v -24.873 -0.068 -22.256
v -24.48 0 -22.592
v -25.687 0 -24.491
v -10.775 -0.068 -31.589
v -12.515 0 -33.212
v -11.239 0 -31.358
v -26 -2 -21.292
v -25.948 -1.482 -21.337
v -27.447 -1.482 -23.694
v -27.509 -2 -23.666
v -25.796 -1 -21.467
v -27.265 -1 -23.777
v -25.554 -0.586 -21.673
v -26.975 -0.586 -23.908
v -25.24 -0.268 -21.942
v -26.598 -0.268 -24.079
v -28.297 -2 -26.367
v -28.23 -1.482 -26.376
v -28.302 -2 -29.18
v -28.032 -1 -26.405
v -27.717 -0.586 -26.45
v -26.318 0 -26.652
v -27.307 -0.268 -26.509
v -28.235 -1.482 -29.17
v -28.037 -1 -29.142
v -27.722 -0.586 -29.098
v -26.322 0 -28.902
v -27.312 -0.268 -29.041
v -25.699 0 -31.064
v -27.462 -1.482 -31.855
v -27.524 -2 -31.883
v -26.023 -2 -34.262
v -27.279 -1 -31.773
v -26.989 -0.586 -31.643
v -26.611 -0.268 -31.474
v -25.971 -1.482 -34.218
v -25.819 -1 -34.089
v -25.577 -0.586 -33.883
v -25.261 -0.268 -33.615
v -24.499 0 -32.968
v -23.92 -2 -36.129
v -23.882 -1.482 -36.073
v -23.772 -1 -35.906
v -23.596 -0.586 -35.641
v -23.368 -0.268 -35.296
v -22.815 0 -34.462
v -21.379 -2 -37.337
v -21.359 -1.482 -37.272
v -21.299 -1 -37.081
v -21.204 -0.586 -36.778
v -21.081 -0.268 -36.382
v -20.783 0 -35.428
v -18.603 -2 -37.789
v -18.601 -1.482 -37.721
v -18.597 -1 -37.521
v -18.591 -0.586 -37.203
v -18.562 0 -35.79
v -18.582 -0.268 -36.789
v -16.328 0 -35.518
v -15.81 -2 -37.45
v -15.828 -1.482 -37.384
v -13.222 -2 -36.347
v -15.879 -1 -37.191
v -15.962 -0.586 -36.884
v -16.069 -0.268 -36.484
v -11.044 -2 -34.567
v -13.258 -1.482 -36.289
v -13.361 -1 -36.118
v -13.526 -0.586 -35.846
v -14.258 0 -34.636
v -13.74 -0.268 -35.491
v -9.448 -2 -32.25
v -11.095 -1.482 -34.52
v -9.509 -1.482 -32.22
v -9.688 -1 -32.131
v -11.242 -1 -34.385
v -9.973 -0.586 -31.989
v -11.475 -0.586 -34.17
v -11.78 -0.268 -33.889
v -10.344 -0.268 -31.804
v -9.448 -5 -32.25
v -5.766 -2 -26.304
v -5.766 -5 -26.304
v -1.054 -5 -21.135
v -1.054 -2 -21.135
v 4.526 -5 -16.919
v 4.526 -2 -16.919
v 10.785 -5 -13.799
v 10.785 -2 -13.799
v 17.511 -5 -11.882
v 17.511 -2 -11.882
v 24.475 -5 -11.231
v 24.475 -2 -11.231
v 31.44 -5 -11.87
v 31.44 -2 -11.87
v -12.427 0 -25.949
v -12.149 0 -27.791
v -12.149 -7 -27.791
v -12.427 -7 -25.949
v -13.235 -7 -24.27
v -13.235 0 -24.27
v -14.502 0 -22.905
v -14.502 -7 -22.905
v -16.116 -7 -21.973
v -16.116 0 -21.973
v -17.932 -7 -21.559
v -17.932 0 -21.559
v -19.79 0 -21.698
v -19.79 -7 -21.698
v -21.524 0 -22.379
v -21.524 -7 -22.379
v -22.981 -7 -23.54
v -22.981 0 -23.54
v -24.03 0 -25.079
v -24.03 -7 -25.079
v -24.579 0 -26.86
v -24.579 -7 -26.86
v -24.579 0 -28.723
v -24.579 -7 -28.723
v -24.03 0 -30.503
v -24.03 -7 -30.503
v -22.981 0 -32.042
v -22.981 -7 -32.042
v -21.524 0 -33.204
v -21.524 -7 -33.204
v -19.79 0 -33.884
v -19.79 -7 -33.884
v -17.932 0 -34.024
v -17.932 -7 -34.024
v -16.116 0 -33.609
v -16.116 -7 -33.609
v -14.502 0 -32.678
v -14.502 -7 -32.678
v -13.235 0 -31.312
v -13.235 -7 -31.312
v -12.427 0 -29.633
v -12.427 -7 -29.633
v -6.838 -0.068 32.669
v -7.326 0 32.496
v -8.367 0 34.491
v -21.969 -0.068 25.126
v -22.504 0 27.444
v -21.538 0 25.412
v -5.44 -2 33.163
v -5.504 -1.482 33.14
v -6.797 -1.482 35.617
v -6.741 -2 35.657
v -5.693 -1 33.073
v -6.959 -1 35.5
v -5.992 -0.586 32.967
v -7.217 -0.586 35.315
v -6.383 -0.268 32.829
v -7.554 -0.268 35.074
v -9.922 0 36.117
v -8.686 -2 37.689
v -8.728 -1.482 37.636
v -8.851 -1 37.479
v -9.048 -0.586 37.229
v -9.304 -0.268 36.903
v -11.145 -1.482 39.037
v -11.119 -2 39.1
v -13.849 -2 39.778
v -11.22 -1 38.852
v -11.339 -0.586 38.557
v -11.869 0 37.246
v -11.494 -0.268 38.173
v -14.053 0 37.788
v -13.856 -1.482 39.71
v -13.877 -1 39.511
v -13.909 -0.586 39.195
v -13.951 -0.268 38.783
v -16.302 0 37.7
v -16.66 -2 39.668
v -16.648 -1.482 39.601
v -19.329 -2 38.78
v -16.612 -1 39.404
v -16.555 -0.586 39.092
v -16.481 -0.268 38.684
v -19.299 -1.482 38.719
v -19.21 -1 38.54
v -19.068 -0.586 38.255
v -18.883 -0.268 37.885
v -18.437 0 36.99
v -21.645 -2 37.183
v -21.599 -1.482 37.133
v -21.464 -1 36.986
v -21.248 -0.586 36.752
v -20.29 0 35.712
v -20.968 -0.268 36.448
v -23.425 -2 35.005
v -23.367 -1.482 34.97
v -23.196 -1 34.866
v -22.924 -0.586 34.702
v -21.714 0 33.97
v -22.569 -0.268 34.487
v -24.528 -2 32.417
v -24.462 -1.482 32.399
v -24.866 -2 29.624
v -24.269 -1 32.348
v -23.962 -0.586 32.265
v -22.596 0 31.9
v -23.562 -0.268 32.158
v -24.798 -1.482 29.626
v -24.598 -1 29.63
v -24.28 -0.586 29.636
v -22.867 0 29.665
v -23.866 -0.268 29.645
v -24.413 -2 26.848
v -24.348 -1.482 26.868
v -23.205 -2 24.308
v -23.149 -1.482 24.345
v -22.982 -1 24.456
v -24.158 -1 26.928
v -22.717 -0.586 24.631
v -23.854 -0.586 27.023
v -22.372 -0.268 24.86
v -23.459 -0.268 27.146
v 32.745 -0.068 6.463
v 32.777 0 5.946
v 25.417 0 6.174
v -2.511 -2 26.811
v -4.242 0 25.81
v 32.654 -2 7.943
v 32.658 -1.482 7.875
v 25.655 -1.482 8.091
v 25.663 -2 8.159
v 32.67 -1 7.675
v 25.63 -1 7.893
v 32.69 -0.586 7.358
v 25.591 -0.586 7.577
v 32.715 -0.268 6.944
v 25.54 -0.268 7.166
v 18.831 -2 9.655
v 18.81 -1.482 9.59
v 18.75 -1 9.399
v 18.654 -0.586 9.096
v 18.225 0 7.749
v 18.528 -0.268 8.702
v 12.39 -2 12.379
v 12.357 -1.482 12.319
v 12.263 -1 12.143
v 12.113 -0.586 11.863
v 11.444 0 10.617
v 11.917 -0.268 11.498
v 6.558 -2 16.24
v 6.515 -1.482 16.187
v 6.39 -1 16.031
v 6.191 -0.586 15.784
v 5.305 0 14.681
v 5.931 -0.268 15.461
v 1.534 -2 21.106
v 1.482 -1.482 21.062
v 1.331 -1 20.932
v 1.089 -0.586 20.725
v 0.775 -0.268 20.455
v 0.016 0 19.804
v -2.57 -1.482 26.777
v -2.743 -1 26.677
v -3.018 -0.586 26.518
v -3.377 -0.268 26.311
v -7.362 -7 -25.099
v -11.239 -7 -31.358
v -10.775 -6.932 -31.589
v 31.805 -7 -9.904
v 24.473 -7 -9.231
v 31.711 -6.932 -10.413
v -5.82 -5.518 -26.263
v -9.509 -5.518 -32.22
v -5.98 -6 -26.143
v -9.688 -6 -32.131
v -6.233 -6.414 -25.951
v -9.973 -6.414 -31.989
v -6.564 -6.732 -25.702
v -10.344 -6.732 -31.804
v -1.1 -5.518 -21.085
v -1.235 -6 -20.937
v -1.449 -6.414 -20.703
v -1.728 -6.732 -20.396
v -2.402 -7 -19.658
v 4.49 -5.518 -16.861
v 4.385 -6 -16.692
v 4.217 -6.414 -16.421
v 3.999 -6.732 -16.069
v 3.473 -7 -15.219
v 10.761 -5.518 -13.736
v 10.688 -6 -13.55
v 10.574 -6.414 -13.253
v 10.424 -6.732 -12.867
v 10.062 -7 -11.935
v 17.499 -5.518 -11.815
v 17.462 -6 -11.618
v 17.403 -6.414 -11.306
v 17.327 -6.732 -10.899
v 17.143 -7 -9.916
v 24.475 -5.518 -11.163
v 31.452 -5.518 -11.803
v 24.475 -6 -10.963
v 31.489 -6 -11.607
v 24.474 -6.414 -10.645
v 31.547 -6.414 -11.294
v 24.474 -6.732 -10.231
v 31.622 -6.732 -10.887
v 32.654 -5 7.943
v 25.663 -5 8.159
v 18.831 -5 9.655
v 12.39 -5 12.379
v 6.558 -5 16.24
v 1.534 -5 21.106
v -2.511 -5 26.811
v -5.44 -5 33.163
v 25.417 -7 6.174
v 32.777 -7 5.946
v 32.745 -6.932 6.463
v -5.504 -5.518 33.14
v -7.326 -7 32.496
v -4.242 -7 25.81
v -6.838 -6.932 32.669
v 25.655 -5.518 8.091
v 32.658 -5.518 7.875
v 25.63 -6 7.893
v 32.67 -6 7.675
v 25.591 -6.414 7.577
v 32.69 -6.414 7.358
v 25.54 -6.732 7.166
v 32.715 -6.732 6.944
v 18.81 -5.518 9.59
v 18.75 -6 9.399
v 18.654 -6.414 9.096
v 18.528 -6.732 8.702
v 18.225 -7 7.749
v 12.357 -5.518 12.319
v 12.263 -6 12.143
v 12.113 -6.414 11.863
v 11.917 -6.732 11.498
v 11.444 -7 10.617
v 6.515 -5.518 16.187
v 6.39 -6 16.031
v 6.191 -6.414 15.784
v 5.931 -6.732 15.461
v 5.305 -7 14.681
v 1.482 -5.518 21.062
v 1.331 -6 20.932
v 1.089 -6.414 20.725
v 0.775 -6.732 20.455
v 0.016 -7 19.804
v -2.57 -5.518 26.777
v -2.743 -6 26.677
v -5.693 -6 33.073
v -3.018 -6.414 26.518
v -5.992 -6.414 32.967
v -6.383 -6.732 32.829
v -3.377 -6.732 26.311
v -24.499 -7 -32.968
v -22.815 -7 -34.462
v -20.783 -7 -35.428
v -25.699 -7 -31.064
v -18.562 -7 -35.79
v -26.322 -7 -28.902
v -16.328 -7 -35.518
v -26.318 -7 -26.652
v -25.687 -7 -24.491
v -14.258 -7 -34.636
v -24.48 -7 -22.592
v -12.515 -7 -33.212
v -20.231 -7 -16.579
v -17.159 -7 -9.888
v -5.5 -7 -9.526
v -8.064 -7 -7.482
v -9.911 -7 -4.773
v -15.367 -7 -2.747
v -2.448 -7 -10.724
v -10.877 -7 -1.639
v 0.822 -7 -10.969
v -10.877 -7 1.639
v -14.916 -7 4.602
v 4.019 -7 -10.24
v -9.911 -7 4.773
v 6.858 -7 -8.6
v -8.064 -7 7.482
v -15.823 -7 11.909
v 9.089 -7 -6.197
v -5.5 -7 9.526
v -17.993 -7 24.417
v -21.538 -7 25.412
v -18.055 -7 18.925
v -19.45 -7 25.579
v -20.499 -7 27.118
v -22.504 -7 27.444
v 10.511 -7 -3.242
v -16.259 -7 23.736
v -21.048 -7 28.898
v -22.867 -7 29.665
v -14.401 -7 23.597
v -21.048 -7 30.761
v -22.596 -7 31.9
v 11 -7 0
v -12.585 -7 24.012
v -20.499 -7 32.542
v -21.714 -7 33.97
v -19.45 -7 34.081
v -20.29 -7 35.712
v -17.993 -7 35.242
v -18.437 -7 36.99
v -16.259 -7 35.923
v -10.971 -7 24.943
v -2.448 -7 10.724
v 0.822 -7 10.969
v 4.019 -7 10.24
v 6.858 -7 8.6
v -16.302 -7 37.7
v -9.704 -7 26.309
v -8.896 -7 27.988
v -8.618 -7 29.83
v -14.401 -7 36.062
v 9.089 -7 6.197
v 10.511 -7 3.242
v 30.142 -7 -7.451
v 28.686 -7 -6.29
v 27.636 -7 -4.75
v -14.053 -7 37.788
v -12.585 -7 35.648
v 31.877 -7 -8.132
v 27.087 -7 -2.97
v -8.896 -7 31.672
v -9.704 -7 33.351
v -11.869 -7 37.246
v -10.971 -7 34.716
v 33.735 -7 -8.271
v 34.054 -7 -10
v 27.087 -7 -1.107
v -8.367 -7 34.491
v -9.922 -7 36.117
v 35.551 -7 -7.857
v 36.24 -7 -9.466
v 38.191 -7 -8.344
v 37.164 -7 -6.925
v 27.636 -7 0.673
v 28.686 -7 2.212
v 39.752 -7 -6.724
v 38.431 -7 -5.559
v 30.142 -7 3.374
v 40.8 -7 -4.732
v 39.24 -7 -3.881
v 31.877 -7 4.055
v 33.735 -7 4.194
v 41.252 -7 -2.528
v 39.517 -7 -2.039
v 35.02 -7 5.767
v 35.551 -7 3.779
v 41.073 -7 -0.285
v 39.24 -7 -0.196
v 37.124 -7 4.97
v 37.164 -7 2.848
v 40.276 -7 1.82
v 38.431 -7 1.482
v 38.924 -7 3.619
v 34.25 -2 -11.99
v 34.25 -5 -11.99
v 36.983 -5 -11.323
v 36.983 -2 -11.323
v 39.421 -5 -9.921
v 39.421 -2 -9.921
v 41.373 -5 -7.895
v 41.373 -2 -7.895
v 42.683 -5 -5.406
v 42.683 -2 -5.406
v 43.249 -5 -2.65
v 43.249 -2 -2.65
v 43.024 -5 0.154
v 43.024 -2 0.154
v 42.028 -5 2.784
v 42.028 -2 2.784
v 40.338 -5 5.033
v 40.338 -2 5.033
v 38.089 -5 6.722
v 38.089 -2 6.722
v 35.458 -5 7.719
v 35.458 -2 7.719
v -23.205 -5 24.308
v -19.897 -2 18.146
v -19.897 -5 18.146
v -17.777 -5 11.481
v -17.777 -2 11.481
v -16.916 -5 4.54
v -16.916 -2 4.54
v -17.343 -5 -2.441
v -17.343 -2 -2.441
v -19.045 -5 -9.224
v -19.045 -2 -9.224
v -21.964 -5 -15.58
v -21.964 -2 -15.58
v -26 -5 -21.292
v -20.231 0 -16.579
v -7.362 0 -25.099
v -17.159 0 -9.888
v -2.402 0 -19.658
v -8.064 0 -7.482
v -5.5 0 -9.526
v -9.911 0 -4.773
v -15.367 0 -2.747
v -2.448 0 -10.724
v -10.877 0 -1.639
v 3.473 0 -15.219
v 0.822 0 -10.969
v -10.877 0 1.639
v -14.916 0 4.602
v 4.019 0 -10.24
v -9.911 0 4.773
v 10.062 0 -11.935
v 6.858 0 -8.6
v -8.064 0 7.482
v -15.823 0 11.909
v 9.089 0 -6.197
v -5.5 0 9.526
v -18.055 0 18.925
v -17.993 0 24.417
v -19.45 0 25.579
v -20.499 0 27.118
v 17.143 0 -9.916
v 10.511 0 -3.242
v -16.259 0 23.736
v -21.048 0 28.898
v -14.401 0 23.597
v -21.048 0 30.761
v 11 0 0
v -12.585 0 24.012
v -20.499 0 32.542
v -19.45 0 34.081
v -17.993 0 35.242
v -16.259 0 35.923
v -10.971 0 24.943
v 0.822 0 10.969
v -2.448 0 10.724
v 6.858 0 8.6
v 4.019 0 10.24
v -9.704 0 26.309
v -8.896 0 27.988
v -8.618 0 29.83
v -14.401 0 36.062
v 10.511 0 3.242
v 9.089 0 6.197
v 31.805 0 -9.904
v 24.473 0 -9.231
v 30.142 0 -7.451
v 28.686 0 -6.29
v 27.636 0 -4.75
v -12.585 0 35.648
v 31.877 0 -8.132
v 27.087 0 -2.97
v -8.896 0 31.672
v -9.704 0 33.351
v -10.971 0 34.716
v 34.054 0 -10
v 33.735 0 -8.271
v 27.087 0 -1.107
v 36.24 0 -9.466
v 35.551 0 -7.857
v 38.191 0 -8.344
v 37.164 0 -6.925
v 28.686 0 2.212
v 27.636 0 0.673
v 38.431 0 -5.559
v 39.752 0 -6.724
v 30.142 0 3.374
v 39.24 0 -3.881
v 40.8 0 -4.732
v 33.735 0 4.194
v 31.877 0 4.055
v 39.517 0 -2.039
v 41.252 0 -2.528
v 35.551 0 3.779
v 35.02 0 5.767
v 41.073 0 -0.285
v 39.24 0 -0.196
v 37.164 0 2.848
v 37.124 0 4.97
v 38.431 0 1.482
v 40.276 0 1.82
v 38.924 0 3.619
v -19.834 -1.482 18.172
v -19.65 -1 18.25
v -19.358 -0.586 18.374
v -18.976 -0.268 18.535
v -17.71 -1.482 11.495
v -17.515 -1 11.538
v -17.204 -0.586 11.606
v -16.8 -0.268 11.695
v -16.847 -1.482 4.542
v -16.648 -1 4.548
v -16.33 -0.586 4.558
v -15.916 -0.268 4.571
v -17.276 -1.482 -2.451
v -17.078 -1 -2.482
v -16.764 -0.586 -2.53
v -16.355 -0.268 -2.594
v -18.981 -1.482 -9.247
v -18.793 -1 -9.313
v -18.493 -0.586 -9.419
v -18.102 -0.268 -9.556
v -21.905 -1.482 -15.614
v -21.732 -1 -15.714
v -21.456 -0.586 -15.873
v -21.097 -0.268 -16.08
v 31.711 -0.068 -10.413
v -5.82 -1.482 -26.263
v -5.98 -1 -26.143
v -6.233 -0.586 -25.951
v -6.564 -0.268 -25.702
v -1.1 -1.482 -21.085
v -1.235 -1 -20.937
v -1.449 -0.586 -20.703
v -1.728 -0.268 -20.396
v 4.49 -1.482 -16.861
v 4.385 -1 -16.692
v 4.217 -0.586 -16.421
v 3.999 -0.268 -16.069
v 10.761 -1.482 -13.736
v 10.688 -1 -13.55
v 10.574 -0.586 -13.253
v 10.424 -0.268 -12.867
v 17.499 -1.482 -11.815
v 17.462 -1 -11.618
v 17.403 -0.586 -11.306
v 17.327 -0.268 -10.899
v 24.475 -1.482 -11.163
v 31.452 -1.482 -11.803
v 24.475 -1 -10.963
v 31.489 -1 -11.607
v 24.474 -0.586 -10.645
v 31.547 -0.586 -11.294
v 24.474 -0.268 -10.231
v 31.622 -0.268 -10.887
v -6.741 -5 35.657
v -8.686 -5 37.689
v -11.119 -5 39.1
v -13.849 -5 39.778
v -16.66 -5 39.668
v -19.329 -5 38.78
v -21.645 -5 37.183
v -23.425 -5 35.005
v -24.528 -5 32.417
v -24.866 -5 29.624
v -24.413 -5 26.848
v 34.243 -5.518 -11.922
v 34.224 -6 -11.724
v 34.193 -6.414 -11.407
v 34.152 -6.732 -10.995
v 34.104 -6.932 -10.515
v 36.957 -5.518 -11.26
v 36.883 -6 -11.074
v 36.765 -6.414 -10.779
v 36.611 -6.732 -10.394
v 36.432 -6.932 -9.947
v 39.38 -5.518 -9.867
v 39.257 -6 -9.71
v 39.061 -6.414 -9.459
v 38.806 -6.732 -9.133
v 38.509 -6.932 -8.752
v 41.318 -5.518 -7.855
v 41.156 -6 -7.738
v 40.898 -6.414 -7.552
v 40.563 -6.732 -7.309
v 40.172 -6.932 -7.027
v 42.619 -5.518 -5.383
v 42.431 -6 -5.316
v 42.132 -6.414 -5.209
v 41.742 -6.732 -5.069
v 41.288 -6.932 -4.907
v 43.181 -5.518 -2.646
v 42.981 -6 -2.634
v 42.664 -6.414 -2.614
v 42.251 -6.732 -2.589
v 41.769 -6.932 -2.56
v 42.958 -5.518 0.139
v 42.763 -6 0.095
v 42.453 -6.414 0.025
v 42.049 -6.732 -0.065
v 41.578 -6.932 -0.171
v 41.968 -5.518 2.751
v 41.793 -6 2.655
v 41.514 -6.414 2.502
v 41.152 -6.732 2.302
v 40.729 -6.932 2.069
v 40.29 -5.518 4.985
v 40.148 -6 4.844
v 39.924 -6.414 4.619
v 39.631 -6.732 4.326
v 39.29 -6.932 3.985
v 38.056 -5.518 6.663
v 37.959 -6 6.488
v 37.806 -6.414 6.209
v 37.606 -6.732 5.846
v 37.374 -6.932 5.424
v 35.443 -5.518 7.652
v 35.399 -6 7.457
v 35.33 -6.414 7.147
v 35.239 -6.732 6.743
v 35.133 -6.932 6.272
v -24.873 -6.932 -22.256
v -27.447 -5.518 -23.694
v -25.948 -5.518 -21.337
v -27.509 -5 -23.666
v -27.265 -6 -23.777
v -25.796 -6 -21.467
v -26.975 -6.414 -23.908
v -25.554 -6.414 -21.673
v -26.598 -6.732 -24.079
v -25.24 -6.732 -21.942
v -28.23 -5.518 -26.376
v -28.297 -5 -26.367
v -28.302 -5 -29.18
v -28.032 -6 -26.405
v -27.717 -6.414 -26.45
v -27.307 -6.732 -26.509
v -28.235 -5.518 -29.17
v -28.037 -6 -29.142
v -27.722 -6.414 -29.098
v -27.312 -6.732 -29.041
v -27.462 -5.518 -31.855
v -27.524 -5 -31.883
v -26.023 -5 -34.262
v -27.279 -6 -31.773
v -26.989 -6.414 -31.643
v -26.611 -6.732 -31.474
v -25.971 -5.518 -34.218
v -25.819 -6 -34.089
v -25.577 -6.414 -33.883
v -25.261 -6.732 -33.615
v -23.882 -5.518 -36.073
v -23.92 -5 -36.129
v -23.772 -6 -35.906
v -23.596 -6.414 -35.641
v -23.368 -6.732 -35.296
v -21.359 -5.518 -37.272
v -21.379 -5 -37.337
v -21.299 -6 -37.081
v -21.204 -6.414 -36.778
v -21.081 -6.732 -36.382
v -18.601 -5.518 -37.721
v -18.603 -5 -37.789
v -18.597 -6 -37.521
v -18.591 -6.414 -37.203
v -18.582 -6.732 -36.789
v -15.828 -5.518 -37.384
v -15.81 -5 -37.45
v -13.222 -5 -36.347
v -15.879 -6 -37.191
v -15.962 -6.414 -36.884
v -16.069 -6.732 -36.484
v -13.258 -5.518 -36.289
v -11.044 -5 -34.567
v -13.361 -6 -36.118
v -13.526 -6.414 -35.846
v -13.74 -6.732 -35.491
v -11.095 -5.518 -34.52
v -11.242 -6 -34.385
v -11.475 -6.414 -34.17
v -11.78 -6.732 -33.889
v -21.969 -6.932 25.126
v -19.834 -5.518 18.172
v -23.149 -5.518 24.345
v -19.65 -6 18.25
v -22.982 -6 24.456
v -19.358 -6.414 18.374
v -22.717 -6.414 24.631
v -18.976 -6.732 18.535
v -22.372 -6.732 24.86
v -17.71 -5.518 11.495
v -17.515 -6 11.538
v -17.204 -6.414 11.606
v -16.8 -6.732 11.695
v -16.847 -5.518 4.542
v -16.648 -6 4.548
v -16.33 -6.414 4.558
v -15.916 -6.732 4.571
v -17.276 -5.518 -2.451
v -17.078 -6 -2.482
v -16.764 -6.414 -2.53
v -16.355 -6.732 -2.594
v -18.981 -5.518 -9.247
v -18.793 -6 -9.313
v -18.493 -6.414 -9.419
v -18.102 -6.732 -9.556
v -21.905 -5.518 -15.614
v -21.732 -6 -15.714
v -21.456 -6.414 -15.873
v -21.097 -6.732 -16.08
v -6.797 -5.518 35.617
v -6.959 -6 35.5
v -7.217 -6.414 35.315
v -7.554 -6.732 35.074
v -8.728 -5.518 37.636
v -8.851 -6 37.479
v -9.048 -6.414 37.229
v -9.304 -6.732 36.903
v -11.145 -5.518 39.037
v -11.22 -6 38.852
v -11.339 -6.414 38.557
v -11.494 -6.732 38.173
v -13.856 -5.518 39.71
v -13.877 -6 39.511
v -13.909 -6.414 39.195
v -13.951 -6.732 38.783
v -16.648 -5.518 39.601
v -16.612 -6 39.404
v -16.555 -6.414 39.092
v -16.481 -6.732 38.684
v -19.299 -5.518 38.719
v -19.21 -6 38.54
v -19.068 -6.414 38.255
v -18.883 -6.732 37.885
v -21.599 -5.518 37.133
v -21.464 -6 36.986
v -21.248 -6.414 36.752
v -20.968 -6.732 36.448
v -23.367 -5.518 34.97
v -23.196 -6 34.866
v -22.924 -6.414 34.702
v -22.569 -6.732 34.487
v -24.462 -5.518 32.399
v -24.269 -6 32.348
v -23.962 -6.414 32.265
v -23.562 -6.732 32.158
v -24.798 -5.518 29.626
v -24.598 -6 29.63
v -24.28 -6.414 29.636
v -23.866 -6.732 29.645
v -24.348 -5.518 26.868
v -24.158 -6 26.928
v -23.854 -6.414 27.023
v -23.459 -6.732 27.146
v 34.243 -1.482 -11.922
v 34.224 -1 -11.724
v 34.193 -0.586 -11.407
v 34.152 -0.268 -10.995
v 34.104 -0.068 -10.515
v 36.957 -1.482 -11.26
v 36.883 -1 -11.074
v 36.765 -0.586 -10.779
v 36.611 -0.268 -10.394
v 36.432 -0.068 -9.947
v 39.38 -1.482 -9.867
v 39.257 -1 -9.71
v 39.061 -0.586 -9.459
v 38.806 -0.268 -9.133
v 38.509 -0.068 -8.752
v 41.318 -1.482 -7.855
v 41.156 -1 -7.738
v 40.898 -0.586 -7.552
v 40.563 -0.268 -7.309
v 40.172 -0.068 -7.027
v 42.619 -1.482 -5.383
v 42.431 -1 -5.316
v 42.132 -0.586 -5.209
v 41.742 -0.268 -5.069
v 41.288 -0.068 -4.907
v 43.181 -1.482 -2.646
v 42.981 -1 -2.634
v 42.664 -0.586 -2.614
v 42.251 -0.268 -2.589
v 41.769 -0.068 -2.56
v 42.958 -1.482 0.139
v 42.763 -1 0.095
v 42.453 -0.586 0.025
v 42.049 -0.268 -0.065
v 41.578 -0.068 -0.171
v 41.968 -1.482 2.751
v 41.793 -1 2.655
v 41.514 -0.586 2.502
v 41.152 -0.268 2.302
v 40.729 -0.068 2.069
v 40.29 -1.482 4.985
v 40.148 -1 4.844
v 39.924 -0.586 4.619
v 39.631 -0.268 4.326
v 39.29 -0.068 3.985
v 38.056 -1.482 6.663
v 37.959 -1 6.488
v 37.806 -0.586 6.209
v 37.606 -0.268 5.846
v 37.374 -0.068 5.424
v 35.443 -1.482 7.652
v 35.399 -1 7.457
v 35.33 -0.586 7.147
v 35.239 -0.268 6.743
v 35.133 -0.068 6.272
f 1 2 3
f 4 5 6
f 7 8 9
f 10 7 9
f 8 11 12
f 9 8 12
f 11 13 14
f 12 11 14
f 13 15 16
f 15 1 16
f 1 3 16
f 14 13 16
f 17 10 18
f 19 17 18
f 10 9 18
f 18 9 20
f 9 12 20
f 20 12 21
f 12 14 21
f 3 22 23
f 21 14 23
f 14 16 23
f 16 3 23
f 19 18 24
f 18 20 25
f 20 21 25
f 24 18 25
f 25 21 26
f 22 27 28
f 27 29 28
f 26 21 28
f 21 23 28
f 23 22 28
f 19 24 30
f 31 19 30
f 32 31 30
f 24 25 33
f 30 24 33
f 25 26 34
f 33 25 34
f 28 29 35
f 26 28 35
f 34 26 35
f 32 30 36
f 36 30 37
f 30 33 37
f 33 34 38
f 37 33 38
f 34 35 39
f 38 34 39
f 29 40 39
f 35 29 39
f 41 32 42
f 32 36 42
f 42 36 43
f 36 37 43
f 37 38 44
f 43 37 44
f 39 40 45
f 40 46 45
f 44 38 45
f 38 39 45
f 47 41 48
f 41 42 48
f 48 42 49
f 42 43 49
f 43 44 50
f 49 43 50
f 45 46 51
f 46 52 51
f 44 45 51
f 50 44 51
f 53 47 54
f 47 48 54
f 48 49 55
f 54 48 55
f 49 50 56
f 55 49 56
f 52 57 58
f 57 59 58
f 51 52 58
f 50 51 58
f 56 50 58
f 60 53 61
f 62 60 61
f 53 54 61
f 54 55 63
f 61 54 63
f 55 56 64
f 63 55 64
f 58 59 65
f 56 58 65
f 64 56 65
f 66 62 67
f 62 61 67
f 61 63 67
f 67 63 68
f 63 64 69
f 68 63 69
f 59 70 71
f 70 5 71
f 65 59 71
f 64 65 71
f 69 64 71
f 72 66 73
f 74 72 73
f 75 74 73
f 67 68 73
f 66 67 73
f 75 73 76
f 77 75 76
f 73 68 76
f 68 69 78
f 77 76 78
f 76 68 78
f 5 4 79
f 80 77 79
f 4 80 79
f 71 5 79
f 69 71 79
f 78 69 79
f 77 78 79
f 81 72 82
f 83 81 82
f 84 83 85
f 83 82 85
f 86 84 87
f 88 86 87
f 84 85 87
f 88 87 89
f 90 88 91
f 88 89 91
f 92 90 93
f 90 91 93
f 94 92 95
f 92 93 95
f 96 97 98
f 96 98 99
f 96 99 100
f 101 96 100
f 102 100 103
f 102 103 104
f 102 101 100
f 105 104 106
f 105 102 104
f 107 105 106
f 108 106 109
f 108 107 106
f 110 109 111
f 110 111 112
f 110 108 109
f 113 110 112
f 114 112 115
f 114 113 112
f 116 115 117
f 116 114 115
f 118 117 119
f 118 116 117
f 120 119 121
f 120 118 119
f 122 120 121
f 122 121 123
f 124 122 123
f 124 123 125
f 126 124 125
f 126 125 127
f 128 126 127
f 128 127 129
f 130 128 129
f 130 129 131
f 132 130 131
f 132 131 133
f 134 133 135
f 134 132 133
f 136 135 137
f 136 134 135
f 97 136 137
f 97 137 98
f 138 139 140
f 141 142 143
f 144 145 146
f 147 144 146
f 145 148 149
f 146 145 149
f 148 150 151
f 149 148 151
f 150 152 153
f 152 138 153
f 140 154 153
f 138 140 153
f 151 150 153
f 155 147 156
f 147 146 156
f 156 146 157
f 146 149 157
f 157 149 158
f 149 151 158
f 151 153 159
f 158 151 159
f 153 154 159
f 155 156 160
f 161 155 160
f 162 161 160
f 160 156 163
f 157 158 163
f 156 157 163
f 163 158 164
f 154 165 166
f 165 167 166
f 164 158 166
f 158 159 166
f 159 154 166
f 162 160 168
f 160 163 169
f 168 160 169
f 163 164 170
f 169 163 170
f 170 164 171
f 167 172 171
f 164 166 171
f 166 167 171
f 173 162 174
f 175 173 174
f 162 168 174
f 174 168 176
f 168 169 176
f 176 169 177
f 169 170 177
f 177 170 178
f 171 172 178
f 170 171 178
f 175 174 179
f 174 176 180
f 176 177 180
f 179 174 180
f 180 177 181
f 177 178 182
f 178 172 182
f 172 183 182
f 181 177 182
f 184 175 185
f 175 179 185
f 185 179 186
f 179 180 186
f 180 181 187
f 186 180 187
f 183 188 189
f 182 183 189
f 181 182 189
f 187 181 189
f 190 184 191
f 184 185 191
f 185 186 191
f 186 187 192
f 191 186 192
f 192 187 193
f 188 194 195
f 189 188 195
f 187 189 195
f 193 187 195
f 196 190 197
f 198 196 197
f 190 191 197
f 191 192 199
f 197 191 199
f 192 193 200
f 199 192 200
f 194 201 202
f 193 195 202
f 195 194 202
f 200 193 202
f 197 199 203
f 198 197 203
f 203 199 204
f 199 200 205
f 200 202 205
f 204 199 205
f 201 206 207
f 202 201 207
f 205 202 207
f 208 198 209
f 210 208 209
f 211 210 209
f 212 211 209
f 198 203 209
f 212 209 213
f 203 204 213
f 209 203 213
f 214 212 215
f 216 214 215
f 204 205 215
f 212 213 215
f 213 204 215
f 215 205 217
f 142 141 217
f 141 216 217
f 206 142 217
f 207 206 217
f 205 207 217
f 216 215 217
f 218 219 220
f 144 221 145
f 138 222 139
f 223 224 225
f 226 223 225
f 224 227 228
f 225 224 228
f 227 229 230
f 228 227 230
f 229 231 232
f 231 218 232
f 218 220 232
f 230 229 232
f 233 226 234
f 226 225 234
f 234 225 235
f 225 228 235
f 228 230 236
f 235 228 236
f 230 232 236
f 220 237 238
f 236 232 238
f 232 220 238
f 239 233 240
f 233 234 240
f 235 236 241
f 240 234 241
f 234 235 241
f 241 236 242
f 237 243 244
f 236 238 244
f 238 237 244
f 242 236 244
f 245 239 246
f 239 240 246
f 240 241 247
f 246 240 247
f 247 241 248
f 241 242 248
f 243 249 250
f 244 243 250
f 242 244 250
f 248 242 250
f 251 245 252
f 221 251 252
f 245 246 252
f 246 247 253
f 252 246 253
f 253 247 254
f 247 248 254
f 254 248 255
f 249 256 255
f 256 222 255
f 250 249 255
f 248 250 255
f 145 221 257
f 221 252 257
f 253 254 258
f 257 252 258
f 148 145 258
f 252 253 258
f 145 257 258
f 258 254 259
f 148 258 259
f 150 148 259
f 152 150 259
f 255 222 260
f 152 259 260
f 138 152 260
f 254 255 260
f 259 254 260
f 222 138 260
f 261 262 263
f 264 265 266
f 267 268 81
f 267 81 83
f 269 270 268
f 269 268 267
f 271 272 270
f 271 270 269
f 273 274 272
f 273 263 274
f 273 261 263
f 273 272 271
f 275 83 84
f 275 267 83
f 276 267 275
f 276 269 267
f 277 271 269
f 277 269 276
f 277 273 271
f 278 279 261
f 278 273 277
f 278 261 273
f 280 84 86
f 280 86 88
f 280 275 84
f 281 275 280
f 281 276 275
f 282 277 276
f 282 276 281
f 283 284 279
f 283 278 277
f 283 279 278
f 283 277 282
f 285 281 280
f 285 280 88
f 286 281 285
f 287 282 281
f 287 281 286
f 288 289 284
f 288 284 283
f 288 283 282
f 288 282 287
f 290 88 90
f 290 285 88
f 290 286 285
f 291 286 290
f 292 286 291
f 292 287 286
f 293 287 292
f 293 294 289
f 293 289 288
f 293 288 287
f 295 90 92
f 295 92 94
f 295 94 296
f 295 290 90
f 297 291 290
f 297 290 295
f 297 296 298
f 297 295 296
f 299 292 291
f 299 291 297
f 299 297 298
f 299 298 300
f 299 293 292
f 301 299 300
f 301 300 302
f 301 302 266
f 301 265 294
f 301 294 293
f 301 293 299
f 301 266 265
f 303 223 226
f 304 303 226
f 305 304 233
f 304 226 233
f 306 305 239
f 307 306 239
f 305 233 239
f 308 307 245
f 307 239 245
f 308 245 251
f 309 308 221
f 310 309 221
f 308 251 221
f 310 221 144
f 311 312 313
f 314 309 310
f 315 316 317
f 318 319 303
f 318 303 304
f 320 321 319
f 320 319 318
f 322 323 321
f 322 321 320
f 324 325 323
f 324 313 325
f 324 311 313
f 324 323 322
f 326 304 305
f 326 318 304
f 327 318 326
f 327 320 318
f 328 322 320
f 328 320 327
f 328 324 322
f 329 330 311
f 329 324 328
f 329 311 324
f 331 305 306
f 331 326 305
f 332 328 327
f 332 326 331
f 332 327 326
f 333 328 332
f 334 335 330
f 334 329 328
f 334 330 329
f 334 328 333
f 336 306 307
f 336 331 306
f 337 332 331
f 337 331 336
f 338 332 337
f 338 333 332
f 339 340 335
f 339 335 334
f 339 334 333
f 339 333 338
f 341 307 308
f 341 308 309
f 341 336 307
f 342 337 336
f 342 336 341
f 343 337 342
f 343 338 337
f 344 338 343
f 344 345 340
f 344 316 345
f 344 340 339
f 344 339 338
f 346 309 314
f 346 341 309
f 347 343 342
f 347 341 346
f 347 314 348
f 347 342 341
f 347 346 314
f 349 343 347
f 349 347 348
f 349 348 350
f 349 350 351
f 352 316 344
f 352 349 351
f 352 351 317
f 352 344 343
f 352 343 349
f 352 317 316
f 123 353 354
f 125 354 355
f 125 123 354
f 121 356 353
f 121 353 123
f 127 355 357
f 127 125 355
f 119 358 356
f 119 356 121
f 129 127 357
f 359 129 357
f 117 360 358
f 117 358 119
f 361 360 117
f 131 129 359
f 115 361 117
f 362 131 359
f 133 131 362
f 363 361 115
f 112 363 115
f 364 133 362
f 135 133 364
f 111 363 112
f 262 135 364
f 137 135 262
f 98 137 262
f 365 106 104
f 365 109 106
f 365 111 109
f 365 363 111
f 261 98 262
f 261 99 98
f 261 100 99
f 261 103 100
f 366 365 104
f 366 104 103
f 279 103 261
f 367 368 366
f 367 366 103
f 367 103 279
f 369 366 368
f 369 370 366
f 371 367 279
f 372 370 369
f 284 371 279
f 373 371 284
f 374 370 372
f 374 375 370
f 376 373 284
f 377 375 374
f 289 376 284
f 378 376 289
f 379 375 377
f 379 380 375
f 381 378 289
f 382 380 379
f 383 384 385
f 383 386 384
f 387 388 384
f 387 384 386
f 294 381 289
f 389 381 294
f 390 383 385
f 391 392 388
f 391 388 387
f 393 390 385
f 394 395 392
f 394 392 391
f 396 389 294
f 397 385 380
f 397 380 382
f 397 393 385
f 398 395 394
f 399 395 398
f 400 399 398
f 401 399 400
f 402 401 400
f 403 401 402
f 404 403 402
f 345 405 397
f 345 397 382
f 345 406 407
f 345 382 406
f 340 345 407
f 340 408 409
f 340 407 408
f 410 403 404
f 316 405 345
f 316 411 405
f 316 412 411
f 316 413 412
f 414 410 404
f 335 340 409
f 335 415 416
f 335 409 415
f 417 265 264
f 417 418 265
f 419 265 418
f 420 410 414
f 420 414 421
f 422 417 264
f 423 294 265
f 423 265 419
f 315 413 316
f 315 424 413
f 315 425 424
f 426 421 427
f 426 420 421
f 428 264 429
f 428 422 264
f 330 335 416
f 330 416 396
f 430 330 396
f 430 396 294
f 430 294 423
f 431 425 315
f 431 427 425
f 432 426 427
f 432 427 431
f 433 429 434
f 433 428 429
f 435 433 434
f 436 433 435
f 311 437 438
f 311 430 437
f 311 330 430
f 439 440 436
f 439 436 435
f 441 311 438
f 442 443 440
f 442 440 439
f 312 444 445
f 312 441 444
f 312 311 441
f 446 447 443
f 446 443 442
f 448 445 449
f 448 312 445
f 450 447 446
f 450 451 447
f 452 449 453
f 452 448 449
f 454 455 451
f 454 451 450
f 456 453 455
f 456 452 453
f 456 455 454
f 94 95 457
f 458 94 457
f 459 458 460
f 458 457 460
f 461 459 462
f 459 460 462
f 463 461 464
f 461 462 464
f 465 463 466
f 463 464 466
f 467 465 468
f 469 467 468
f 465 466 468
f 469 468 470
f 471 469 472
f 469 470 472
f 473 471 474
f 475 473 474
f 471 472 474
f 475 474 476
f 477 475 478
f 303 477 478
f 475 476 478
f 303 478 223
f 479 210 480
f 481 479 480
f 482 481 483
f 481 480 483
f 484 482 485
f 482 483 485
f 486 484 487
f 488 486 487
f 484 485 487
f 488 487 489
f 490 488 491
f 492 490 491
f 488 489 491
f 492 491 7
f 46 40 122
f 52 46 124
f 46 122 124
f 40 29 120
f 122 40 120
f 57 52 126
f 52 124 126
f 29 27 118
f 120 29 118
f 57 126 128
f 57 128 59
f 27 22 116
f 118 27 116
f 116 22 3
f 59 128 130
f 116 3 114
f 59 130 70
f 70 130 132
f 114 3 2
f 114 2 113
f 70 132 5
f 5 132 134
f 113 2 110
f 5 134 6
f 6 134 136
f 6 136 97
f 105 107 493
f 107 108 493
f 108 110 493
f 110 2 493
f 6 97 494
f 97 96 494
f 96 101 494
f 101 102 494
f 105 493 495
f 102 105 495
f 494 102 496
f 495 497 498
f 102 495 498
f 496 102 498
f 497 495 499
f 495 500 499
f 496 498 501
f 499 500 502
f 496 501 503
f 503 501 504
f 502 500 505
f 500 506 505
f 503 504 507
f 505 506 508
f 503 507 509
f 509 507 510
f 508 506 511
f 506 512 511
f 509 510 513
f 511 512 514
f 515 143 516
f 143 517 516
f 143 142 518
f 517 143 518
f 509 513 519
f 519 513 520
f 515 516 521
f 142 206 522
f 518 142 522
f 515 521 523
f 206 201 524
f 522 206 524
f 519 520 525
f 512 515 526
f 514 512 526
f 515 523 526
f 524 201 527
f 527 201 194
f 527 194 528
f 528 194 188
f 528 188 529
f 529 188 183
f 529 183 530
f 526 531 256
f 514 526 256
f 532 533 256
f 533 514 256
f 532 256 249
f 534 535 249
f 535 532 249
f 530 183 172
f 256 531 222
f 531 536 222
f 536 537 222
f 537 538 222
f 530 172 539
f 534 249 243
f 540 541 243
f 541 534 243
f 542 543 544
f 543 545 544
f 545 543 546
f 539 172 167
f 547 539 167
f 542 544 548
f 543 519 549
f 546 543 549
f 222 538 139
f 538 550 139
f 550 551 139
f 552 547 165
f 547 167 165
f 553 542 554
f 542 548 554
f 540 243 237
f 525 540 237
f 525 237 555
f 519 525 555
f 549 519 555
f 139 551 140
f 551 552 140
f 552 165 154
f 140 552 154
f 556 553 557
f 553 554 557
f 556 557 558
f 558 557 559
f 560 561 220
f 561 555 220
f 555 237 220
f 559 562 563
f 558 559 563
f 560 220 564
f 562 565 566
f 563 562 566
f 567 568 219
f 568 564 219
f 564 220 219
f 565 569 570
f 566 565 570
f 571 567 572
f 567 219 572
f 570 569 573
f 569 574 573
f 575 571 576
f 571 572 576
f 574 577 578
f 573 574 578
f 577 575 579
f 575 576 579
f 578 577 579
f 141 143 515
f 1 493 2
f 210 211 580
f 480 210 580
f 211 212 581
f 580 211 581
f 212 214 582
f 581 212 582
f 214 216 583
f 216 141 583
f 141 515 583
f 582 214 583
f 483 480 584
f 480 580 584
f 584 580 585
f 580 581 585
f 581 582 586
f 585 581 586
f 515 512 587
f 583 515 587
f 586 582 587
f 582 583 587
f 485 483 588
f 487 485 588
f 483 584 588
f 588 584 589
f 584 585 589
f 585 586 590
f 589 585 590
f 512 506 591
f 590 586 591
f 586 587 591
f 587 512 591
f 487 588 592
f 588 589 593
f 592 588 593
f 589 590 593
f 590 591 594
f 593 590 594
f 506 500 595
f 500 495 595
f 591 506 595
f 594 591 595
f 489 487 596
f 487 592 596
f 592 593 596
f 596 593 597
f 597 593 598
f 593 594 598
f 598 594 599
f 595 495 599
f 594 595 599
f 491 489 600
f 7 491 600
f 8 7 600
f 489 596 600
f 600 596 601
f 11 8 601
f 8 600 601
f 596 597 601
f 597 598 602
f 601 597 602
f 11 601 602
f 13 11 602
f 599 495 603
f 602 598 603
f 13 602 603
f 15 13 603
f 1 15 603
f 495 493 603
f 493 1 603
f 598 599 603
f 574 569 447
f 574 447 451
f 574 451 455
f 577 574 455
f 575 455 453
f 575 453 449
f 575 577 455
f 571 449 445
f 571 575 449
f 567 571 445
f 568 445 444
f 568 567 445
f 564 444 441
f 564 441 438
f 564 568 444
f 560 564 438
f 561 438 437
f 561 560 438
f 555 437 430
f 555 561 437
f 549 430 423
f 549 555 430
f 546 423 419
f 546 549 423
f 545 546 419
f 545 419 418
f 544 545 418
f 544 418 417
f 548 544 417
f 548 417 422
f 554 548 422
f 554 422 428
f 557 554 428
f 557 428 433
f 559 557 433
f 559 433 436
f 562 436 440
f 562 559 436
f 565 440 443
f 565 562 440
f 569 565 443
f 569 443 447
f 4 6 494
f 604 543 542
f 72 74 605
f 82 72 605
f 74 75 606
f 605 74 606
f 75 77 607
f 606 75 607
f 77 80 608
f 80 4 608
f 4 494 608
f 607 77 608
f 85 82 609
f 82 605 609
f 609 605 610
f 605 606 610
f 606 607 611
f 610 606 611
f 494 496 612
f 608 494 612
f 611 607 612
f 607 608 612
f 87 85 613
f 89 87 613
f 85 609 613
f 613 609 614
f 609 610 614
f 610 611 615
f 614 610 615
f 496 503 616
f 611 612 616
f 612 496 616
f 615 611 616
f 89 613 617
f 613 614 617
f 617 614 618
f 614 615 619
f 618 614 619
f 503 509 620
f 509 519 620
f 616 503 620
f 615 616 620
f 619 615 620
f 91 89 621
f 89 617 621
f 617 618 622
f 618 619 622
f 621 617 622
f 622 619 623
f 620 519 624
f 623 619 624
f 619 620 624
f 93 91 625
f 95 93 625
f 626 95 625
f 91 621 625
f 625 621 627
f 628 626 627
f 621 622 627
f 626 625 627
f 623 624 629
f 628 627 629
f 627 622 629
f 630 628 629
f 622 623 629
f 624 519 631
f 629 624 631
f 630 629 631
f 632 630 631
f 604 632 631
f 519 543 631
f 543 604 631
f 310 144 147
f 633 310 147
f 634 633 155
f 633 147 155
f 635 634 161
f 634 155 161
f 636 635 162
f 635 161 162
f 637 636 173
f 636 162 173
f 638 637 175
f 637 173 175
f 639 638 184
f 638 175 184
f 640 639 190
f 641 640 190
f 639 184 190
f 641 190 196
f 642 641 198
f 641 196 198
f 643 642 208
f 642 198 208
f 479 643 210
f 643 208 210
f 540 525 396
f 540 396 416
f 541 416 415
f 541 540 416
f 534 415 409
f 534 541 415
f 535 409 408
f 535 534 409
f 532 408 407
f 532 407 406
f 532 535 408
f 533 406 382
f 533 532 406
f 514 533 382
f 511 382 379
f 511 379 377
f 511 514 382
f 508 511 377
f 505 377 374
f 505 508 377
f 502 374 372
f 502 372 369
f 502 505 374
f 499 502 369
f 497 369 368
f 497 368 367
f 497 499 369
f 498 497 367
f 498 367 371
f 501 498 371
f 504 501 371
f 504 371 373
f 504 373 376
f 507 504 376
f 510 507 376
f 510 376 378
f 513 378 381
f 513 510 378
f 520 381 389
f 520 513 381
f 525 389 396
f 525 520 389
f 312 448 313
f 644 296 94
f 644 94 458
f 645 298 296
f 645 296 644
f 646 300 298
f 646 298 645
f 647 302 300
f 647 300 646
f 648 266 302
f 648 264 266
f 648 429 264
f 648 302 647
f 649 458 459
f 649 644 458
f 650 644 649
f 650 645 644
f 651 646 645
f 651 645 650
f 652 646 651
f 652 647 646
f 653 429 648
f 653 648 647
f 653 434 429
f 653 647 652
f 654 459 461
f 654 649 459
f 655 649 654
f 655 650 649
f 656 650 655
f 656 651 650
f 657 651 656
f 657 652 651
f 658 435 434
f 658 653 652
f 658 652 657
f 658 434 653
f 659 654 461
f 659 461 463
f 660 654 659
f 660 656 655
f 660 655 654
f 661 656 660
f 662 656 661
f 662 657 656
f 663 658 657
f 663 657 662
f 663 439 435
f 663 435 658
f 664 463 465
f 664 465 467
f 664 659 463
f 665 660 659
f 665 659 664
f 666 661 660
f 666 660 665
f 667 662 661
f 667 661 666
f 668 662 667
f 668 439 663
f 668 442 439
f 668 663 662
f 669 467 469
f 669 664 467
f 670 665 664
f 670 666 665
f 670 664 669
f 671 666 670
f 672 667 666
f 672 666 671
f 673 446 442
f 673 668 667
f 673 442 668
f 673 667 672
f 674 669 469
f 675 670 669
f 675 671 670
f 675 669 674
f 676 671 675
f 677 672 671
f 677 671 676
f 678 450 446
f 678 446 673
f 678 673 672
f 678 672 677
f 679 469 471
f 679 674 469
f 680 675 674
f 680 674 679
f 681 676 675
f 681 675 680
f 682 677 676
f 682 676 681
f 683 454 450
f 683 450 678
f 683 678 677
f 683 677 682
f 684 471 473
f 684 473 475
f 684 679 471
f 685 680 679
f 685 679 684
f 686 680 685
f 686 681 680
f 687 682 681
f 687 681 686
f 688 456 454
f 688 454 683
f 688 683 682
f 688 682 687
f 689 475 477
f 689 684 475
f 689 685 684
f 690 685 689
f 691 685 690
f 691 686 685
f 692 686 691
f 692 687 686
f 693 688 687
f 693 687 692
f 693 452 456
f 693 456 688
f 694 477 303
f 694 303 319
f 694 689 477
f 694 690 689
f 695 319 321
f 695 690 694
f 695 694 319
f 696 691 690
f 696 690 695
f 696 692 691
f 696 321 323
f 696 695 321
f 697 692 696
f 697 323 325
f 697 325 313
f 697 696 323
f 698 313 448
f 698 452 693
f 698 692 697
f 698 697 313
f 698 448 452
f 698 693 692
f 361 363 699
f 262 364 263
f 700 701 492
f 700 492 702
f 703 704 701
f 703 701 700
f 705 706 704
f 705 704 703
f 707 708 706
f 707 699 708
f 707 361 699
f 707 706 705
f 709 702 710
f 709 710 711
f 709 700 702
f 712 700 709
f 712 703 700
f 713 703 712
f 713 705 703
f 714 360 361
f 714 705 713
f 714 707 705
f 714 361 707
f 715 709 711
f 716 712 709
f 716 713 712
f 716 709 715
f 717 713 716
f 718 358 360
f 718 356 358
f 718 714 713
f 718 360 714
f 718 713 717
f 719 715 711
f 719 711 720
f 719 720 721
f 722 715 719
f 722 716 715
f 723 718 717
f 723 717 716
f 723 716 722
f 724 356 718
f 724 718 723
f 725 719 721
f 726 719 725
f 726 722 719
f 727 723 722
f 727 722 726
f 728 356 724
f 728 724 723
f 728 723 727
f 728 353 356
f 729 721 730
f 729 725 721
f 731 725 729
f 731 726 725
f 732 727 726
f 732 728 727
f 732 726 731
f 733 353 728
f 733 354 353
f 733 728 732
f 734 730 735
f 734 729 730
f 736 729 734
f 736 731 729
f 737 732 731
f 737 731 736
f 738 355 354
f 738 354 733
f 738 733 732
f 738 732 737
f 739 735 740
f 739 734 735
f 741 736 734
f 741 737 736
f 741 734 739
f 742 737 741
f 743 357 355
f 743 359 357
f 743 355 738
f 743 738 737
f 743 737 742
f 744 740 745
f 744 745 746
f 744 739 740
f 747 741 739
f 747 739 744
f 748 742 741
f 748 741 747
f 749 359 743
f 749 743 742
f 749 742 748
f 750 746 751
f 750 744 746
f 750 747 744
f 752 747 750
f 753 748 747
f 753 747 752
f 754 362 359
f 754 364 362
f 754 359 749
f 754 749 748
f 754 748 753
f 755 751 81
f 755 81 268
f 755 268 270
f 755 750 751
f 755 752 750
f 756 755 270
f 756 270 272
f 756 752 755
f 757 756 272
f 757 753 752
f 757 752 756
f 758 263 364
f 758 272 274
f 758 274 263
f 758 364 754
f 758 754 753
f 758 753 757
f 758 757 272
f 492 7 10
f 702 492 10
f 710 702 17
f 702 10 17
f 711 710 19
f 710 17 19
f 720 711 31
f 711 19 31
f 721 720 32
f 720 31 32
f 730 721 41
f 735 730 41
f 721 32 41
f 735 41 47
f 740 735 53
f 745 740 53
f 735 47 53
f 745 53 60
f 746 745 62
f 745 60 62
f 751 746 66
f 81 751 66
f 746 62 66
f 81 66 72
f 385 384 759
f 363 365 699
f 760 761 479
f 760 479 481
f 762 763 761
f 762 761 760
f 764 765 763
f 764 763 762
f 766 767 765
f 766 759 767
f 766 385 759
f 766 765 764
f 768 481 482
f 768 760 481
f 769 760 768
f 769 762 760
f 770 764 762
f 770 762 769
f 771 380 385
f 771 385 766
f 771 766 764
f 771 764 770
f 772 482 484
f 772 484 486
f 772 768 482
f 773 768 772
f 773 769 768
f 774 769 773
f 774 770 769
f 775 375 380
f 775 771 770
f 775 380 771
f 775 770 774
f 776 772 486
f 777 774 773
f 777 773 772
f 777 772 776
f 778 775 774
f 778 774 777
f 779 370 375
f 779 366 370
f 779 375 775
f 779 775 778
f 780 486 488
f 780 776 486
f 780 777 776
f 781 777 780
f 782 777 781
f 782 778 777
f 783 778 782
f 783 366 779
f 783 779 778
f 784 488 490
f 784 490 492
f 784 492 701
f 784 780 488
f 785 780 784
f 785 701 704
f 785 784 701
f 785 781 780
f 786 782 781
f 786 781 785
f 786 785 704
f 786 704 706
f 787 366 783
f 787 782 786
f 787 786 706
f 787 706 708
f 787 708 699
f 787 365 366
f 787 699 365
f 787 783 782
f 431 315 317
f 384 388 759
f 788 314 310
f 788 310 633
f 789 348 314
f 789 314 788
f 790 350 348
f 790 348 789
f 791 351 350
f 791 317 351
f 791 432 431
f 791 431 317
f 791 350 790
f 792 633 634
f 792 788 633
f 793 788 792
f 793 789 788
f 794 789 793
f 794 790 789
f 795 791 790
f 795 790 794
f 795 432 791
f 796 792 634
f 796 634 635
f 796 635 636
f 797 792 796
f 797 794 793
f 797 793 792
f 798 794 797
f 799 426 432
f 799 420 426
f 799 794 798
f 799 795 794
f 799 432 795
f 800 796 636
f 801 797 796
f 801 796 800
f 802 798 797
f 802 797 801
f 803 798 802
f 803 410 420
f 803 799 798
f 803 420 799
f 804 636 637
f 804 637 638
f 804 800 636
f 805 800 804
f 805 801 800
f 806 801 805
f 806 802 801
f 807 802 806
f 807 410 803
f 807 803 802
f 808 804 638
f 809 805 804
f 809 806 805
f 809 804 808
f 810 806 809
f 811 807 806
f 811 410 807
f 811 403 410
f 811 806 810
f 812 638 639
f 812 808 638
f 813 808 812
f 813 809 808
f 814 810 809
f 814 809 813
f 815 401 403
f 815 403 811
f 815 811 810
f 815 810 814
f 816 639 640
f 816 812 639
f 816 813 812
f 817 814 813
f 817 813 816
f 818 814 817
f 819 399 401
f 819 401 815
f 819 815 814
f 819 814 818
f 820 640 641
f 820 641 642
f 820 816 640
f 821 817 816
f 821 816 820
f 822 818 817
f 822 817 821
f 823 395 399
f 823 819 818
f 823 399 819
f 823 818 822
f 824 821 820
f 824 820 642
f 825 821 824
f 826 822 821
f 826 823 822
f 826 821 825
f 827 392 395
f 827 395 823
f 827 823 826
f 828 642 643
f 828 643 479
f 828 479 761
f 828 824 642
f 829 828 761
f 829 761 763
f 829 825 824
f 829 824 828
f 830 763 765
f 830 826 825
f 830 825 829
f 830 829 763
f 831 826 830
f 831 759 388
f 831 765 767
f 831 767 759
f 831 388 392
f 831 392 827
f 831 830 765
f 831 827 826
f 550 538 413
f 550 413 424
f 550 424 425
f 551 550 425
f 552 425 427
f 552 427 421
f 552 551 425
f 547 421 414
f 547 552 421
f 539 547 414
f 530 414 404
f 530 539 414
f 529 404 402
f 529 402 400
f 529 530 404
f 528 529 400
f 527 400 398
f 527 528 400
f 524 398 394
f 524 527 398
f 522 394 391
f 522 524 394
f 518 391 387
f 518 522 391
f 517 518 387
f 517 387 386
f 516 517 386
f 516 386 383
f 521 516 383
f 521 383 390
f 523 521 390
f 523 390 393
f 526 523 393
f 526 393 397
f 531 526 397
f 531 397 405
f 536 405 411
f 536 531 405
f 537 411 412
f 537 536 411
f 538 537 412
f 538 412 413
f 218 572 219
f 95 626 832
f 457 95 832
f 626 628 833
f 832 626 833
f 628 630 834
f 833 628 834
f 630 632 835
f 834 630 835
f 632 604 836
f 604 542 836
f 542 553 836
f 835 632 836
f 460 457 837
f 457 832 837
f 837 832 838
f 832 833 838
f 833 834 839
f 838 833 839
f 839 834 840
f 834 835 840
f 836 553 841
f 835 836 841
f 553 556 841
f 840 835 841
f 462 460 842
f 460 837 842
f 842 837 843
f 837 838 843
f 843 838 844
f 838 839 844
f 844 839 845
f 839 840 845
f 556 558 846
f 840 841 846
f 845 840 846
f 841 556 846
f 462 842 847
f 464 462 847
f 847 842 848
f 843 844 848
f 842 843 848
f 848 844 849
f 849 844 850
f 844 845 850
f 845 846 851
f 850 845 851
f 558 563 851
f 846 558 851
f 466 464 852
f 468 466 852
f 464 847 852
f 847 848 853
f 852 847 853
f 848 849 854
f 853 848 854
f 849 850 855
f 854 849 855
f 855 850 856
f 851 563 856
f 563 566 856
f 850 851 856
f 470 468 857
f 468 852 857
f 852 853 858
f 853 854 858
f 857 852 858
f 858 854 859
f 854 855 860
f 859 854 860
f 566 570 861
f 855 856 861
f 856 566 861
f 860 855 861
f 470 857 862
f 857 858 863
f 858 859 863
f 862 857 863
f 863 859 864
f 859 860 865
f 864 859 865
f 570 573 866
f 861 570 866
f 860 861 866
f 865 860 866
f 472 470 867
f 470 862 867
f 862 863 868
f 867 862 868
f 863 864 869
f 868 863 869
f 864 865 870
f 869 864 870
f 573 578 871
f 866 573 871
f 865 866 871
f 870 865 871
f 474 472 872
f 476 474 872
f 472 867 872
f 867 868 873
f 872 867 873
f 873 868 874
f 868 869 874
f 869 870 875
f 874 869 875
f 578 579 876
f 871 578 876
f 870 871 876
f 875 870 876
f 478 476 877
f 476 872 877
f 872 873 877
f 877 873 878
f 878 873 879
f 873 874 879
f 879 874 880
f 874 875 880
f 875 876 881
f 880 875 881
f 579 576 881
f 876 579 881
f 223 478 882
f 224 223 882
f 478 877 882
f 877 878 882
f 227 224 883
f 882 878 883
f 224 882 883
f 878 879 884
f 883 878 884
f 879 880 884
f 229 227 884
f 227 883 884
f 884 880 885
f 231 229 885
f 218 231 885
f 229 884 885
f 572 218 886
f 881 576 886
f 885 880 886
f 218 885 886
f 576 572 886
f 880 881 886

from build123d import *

# Parameters (mm, degrees)
F0_R     = 6.25
F0_R_2   = 11
F1_DEPTH = 7
F2_R     = 2


with BuildPart() as f1:
    # F0 (on Front) → F1 (new body)
    with BuildSketch(Plane.XZ):
        with BuildLine():
            ThreePointArc((-9.448443, -32.250276), (7.583595, -15.214765), (31.439673, -11.870146))
            ThreePointArc((31.439673, -11.870146), (43.248737, -2.65025), (32.65378, 7.942547))
            ThreePointArc((32.65378, 7.942547), (9.384576, 14.174969), (-5.439988, 33.162628))
            ThreePointArc((-5.439988, 33.162628), (-19.329184, 38.77963), (-23.205337, 24.307729))
            ThreePointArc((-23.205337, 24.307729), (-16.968171, 1.039797), (-25.999684, -21.292482))
            ThreePointArc((-25.999684, -21.292482), (-23.919553, -36.12938), (-9.448443, -32.250276))
        make_face()
        with Locations((-18.399214, -27.791163)):
            Circle(F0_R, mode=Mode.SUBTRACT)
        Circle(F0_R_2, mode=Mode.SUBTRACT)
        with Locations((33.26746, -2.038605)):
            Circle(F0_R, mode=Mode.SUBTRACT)
        with Locations((-14.868246, 29.829768)):
            Circle(F0_R, mode=Mode.SUBTRACT)
    extrude(amount=F1_DEPTH)

    # F2
    f2_edges = [f1.edges().sort_by_distance(p)[0] for p in [
        (-16.968171, -7, 1.039797),
        (7.583595, 0, -15.214765),
    ]]
    fillet(f2_edges, radius=F2_R)


solid = f1.part
